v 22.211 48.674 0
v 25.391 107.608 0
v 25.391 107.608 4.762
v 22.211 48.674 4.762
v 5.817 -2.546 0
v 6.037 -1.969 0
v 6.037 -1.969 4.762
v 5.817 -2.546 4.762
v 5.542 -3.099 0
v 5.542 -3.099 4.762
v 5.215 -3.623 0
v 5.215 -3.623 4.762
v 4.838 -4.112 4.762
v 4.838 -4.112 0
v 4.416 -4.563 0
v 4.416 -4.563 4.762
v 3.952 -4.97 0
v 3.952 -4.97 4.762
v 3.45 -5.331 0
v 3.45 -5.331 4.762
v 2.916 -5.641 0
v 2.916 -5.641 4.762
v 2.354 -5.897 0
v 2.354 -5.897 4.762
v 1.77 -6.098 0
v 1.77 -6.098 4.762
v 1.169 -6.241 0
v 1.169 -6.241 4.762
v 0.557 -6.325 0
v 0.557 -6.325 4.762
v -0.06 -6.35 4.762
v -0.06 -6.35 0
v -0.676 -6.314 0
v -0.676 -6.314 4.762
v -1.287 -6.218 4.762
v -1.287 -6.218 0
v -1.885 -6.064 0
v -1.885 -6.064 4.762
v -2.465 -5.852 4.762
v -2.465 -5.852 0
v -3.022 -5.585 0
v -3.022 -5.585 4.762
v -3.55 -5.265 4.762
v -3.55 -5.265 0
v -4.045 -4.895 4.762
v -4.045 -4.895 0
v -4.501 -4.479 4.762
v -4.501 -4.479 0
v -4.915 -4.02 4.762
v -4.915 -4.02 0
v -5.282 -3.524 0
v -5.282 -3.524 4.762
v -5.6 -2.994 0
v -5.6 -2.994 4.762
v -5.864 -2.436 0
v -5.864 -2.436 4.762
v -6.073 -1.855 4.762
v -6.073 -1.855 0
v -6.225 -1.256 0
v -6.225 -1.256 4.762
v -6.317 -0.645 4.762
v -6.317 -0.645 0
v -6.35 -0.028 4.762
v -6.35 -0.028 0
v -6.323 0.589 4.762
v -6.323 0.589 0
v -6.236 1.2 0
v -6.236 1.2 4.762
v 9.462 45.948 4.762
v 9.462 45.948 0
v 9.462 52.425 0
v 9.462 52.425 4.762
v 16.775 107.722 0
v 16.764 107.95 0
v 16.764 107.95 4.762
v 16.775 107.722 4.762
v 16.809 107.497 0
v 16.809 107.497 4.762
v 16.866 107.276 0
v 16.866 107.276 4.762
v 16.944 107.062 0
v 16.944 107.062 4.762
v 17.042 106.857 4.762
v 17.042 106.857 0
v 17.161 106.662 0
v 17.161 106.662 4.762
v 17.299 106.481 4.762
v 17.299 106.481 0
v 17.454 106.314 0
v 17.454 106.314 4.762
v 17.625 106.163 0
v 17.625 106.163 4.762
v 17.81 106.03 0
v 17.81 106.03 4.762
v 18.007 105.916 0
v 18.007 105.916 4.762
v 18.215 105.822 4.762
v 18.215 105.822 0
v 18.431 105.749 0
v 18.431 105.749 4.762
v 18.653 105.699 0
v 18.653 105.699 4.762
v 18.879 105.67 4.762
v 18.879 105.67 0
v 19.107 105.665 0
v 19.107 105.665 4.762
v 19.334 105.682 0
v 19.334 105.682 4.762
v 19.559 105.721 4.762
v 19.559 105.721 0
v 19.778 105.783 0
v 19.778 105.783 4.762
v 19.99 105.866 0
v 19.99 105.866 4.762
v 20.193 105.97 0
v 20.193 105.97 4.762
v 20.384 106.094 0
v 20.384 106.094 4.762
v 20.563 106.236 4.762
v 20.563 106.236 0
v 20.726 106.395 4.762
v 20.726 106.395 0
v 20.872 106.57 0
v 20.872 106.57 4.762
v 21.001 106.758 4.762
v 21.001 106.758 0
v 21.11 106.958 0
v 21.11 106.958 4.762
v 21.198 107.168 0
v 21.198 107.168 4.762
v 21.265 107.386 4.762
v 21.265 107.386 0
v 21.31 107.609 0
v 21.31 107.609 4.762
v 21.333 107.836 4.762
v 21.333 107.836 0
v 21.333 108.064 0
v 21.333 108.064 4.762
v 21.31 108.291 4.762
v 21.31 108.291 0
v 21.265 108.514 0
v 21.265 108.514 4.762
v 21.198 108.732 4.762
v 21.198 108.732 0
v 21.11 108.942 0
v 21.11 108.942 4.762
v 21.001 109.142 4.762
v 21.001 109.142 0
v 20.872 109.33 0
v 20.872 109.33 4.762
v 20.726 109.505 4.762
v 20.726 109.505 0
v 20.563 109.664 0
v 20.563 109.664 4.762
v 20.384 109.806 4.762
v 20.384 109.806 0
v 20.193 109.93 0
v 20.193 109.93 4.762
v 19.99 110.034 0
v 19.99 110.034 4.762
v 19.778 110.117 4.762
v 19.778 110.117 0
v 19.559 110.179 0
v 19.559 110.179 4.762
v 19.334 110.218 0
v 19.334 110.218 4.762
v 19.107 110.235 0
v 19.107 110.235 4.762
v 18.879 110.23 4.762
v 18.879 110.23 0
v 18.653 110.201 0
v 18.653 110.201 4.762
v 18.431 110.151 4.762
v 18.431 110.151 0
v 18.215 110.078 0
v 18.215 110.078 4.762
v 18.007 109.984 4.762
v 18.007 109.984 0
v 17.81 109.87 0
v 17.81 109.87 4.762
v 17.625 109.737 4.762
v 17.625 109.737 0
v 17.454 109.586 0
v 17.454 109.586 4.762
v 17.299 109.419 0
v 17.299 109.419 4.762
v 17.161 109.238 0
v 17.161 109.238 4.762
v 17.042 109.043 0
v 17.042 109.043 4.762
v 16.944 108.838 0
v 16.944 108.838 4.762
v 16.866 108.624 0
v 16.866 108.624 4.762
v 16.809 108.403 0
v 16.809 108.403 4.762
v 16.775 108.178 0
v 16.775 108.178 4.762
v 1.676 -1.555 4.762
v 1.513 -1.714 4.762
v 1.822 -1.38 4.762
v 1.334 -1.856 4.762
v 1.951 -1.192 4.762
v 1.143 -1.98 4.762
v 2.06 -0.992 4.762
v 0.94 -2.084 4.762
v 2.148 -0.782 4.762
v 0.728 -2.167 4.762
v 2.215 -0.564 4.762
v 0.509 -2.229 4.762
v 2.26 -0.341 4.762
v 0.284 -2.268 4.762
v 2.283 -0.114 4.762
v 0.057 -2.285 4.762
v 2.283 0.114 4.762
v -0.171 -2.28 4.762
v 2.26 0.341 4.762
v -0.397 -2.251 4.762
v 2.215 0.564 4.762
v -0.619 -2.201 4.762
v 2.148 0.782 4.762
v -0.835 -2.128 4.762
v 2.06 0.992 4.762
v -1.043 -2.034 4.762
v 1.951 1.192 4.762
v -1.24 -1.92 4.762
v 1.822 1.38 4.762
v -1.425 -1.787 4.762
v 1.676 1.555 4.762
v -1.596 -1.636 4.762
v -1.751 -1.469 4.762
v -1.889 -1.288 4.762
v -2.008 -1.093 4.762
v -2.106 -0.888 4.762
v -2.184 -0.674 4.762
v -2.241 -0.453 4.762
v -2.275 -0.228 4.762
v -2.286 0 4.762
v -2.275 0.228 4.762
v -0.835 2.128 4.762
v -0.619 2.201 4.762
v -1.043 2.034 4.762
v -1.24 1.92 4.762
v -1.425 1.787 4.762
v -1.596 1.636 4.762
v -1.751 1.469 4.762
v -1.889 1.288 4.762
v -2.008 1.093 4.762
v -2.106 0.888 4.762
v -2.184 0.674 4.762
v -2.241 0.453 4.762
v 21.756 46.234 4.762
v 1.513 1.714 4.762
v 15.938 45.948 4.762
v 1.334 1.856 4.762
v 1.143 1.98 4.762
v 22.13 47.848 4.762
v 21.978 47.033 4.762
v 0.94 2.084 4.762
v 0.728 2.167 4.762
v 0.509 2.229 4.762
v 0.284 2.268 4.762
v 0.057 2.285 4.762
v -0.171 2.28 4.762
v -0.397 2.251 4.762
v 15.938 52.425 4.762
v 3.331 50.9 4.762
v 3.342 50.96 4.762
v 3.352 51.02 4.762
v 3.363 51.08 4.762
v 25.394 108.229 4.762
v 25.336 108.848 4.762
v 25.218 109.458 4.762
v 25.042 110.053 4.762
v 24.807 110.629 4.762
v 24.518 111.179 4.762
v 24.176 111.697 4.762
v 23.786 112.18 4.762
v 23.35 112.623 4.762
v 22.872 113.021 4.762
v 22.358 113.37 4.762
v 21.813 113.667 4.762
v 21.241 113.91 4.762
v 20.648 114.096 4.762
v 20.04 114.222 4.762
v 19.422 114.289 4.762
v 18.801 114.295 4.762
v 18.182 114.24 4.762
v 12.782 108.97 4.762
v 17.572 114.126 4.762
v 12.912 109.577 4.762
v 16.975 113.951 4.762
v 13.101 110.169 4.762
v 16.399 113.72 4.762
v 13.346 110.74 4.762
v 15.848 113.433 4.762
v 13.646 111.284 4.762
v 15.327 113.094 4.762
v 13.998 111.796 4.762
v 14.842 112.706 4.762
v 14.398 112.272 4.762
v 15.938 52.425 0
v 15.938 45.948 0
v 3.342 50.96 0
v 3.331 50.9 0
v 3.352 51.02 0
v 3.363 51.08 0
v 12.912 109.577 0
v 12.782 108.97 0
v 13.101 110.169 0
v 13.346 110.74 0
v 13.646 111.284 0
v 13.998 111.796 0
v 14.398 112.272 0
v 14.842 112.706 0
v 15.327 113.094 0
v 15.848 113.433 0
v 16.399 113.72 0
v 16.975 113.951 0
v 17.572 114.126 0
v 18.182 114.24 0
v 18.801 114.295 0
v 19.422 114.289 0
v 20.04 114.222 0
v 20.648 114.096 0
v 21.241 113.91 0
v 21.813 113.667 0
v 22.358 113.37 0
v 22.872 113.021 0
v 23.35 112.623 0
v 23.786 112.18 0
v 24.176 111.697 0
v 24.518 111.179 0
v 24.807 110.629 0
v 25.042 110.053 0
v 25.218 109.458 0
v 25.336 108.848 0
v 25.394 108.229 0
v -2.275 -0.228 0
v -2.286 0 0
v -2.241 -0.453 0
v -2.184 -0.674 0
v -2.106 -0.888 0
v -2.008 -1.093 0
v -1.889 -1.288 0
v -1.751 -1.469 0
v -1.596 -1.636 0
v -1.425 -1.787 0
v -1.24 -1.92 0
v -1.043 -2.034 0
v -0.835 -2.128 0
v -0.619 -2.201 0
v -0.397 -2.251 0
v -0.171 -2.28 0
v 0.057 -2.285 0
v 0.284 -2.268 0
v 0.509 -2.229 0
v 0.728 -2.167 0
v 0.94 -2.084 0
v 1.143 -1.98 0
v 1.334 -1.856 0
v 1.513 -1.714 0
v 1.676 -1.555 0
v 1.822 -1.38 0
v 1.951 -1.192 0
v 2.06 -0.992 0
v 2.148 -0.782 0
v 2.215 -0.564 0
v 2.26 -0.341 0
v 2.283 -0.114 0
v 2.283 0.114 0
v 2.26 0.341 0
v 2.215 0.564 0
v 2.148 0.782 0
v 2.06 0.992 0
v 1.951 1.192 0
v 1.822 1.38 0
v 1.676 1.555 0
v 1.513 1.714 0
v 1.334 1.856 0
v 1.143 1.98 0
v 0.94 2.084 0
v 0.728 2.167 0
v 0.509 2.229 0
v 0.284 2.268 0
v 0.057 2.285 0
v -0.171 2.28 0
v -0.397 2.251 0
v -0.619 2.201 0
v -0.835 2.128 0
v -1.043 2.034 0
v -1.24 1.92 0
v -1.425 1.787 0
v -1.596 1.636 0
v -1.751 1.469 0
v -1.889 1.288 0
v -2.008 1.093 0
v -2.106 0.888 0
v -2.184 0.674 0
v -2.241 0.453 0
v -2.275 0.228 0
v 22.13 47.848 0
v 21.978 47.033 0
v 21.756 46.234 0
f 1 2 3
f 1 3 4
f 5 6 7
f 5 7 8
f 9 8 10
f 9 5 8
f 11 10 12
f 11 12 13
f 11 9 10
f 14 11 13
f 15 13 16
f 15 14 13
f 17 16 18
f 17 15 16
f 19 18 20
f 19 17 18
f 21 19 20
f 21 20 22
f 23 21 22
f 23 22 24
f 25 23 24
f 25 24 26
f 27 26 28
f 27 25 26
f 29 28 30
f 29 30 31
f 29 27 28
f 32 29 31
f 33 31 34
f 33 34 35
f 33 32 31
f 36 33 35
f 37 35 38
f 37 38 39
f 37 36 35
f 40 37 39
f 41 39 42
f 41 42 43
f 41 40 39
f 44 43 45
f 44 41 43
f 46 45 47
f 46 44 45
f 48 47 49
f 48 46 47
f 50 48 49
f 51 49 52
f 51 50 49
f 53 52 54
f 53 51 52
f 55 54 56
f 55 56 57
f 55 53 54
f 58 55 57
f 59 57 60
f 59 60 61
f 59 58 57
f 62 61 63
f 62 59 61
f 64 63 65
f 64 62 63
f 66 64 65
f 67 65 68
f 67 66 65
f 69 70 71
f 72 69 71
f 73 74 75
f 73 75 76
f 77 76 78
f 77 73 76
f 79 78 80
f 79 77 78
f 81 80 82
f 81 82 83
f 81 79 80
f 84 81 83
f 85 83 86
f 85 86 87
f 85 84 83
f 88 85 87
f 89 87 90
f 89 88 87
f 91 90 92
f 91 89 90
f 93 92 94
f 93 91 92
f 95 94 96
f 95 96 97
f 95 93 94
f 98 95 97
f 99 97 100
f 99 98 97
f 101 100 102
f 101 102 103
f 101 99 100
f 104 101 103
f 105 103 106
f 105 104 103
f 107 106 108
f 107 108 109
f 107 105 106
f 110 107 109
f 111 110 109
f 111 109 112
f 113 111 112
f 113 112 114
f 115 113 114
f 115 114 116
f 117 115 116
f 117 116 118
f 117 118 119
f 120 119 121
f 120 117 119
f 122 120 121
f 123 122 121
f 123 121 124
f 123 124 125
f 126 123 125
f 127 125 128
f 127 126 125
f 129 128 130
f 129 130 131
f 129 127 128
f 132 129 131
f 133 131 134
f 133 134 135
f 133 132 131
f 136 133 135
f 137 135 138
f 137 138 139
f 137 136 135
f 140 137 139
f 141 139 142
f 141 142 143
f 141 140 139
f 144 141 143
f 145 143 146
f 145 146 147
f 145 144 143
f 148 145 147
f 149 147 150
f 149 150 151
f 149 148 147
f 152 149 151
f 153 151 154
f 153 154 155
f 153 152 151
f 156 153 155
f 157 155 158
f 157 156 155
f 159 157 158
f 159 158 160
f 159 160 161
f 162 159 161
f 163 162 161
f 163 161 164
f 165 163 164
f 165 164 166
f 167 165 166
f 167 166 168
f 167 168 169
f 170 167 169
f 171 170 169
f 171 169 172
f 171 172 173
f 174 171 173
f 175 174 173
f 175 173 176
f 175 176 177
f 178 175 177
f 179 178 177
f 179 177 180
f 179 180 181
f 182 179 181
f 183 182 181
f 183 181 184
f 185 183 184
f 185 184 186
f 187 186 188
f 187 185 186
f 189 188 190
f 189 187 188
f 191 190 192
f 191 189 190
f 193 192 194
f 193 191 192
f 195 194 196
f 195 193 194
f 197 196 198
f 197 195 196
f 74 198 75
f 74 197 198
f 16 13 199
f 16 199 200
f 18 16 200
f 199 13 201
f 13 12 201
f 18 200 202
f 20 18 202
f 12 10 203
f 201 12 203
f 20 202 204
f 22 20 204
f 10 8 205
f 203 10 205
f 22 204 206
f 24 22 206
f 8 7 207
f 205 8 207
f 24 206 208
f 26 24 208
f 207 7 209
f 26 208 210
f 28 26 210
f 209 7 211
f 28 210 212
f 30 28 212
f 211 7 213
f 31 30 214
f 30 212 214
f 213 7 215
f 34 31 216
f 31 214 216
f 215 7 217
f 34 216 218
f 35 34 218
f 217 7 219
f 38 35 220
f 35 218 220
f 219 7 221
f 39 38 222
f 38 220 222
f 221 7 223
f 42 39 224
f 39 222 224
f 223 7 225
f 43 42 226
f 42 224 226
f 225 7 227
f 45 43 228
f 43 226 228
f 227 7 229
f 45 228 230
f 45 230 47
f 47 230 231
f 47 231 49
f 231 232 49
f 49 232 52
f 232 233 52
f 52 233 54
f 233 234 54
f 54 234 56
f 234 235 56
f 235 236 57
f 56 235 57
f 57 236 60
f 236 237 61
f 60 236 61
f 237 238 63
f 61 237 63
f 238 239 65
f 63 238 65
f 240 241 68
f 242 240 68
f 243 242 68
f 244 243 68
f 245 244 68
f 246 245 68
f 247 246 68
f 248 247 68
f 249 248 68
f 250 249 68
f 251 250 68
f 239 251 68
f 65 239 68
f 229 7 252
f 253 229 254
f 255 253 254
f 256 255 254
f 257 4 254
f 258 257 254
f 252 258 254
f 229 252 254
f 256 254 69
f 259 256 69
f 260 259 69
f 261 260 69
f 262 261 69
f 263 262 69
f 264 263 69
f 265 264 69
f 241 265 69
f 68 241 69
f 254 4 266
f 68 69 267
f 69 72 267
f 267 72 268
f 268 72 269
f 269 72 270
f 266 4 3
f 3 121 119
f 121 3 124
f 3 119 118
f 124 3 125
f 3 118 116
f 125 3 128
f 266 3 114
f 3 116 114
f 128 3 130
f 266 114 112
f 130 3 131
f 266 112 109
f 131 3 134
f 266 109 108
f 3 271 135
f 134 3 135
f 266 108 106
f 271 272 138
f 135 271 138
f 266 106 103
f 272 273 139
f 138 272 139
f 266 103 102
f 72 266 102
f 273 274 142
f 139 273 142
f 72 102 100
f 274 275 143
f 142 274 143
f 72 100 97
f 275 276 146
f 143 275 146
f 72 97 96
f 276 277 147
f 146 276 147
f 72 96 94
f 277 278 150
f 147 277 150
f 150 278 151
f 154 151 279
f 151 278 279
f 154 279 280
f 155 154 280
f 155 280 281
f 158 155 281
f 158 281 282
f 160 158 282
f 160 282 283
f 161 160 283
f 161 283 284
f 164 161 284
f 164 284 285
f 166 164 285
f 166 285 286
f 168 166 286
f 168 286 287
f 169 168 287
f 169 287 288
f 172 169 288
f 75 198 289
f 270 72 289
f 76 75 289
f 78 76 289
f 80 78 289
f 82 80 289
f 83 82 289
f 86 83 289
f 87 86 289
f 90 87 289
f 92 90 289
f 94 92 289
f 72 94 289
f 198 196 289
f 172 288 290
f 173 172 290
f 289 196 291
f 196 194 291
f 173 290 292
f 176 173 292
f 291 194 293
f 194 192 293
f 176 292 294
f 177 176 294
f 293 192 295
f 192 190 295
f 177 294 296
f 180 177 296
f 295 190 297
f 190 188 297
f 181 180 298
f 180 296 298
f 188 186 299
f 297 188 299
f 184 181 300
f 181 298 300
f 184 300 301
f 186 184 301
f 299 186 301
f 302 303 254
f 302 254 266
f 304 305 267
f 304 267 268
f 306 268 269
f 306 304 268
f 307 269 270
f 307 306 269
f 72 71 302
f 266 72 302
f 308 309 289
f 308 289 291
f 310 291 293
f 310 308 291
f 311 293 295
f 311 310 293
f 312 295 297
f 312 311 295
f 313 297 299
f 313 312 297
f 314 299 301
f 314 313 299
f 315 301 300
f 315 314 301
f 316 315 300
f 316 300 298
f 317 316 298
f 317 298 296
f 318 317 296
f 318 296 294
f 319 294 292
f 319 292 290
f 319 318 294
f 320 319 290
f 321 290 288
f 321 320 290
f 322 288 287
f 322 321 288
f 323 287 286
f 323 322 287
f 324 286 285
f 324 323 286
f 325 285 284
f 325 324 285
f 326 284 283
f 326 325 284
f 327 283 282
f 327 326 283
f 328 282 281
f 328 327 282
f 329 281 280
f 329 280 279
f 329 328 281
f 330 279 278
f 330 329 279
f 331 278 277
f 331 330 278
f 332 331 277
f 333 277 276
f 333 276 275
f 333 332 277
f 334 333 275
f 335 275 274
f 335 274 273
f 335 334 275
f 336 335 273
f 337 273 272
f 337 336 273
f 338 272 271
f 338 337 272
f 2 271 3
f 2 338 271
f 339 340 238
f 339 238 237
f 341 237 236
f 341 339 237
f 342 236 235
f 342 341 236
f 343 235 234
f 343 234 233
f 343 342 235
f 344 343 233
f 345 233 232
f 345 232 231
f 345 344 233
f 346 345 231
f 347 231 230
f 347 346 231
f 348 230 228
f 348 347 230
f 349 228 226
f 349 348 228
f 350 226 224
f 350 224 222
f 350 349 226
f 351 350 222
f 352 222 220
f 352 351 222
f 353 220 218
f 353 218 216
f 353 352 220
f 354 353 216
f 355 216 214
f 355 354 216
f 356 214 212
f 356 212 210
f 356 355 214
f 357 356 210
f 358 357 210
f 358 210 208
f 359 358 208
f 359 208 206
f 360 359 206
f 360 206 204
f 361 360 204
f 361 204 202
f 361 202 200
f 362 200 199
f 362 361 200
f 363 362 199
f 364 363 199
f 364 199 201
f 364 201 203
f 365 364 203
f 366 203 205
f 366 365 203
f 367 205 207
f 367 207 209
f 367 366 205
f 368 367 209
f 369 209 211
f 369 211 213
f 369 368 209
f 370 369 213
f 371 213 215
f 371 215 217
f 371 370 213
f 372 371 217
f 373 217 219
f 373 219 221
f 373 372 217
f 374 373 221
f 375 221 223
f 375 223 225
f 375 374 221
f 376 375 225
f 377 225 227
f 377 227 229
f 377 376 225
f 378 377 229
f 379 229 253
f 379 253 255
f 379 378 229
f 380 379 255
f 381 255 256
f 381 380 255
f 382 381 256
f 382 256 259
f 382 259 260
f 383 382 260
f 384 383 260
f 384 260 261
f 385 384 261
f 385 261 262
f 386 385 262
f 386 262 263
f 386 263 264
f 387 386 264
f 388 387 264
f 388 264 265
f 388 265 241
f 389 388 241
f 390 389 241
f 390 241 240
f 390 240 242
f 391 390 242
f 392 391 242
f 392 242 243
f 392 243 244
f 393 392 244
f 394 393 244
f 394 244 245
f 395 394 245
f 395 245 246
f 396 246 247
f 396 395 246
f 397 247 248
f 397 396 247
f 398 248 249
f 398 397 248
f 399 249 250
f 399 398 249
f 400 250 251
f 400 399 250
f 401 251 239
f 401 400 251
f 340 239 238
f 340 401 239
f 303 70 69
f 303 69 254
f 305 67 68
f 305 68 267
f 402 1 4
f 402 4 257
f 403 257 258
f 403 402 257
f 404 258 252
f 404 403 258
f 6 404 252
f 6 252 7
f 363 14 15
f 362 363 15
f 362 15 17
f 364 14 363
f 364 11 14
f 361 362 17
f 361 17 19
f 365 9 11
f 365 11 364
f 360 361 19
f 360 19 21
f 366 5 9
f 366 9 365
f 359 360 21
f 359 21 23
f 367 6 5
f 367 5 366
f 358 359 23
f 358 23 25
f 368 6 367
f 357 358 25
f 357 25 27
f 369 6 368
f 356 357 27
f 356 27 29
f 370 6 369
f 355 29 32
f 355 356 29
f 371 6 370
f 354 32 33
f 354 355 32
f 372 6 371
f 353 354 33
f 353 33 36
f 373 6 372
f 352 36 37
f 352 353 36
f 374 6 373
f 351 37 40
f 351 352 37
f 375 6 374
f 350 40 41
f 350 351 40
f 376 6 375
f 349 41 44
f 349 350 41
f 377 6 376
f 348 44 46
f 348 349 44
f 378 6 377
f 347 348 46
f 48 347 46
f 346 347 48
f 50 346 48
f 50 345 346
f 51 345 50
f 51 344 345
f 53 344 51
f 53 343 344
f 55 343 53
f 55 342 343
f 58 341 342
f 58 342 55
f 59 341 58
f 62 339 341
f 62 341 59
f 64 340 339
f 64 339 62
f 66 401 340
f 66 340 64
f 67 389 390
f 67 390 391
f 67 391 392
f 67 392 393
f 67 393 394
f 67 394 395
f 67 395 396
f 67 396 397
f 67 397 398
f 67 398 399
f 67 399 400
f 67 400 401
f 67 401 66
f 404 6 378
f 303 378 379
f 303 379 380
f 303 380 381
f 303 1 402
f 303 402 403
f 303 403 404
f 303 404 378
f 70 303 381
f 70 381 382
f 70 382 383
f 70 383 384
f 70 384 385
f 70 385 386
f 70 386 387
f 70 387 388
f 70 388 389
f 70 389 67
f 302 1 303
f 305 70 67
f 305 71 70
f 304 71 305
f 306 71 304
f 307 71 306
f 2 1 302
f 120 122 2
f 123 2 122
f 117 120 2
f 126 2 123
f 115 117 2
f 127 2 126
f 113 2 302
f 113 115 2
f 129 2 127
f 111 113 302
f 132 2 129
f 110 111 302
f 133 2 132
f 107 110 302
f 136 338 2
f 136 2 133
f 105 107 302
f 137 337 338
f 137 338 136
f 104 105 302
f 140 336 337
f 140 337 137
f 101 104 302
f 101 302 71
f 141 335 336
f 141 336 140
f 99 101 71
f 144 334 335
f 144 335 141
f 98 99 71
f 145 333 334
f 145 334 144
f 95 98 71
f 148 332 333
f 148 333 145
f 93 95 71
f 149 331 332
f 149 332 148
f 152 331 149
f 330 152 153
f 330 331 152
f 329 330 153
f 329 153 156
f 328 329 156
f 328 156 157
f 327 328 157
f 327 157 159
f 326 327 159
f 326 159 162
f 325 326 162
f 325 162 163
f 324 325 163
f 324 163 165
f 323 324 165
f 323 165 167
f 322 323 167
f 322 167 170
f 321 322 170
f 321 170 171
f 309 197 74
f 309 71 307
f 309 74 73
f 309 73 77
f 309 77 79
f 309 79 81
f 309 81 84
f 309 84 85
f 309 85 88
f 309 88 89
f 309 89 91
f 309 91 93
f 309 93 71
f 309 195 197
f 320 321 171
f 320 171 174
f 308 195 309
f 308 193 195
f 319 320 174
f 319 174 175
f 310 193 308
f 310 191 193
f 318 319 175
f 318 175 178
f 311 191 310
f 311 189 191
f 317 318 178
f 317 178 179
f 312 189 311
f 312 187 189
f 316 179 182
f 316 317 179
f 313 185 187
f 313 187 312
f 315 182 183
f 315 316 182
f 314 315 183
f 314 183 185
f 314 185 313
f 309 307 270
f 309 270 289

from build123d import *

# Parameters (mm, degrees)
SKETCH1_R           = 2.286
SKETCH1_W           = 6.477
SKETCH1_H           = 6.477
BOSS_EXTRUDE1_DEPTH = 4.7625


with BuildPart() as part:
    # Sketch1 → Boss-Extrude1 (new body)
    with BuildSketch(Plane.XY):
        with BuildLine():
            Line((-6.235543901, 1.200205089), (3.330554168, 50.899898088))
            ThreePointArc((3.330554168, 50.899898088), (3.347215179, 50.989952859), (3.362575674, 51.080238551))
            Line((3.362575674, 51.080238551), (12.782434592, 108.969864627))
            ThreePointArc((12.782434592, 108.969864627), (19.731964071, 114.263273715), (25.390778308, 107.607902862))
            Line((25.390778308, 107.607902862), (22.211167462, 48.67374279))
            ThreePointArc((22.211167462, 48.67374279), (22.06323721, 47.438914255), (21.755683067, 46.233885077))
            Line((21.755683067, 46.233885077), (6.037122044, -1.968668947))
            ThreePointArc((6.037122044, -1.968668947), (-1.587540069, -6.148350716), (-6.235543901, 1.200205089))
        make_face()
        with Locations(Location((0, 0, 0), (0, 0, 180))):
            Circle(SKETCH1_R, mode=Mode.SUBTRACT)
        with Locations(Location((19.05, 107.95, 0), (0, 0, 180))):
            Circle(SKETCH1_R, mode=Mode.SUBTRACT)
        with Locations((12.7, 49.186888497)):
            Rectangle(SKETCH1_W, SKETCH1_H, mode=Mode.SUBTRACT)
    extrude(amount=BOSS_EXTRUDE1_DEPTH)


solid = part.part
